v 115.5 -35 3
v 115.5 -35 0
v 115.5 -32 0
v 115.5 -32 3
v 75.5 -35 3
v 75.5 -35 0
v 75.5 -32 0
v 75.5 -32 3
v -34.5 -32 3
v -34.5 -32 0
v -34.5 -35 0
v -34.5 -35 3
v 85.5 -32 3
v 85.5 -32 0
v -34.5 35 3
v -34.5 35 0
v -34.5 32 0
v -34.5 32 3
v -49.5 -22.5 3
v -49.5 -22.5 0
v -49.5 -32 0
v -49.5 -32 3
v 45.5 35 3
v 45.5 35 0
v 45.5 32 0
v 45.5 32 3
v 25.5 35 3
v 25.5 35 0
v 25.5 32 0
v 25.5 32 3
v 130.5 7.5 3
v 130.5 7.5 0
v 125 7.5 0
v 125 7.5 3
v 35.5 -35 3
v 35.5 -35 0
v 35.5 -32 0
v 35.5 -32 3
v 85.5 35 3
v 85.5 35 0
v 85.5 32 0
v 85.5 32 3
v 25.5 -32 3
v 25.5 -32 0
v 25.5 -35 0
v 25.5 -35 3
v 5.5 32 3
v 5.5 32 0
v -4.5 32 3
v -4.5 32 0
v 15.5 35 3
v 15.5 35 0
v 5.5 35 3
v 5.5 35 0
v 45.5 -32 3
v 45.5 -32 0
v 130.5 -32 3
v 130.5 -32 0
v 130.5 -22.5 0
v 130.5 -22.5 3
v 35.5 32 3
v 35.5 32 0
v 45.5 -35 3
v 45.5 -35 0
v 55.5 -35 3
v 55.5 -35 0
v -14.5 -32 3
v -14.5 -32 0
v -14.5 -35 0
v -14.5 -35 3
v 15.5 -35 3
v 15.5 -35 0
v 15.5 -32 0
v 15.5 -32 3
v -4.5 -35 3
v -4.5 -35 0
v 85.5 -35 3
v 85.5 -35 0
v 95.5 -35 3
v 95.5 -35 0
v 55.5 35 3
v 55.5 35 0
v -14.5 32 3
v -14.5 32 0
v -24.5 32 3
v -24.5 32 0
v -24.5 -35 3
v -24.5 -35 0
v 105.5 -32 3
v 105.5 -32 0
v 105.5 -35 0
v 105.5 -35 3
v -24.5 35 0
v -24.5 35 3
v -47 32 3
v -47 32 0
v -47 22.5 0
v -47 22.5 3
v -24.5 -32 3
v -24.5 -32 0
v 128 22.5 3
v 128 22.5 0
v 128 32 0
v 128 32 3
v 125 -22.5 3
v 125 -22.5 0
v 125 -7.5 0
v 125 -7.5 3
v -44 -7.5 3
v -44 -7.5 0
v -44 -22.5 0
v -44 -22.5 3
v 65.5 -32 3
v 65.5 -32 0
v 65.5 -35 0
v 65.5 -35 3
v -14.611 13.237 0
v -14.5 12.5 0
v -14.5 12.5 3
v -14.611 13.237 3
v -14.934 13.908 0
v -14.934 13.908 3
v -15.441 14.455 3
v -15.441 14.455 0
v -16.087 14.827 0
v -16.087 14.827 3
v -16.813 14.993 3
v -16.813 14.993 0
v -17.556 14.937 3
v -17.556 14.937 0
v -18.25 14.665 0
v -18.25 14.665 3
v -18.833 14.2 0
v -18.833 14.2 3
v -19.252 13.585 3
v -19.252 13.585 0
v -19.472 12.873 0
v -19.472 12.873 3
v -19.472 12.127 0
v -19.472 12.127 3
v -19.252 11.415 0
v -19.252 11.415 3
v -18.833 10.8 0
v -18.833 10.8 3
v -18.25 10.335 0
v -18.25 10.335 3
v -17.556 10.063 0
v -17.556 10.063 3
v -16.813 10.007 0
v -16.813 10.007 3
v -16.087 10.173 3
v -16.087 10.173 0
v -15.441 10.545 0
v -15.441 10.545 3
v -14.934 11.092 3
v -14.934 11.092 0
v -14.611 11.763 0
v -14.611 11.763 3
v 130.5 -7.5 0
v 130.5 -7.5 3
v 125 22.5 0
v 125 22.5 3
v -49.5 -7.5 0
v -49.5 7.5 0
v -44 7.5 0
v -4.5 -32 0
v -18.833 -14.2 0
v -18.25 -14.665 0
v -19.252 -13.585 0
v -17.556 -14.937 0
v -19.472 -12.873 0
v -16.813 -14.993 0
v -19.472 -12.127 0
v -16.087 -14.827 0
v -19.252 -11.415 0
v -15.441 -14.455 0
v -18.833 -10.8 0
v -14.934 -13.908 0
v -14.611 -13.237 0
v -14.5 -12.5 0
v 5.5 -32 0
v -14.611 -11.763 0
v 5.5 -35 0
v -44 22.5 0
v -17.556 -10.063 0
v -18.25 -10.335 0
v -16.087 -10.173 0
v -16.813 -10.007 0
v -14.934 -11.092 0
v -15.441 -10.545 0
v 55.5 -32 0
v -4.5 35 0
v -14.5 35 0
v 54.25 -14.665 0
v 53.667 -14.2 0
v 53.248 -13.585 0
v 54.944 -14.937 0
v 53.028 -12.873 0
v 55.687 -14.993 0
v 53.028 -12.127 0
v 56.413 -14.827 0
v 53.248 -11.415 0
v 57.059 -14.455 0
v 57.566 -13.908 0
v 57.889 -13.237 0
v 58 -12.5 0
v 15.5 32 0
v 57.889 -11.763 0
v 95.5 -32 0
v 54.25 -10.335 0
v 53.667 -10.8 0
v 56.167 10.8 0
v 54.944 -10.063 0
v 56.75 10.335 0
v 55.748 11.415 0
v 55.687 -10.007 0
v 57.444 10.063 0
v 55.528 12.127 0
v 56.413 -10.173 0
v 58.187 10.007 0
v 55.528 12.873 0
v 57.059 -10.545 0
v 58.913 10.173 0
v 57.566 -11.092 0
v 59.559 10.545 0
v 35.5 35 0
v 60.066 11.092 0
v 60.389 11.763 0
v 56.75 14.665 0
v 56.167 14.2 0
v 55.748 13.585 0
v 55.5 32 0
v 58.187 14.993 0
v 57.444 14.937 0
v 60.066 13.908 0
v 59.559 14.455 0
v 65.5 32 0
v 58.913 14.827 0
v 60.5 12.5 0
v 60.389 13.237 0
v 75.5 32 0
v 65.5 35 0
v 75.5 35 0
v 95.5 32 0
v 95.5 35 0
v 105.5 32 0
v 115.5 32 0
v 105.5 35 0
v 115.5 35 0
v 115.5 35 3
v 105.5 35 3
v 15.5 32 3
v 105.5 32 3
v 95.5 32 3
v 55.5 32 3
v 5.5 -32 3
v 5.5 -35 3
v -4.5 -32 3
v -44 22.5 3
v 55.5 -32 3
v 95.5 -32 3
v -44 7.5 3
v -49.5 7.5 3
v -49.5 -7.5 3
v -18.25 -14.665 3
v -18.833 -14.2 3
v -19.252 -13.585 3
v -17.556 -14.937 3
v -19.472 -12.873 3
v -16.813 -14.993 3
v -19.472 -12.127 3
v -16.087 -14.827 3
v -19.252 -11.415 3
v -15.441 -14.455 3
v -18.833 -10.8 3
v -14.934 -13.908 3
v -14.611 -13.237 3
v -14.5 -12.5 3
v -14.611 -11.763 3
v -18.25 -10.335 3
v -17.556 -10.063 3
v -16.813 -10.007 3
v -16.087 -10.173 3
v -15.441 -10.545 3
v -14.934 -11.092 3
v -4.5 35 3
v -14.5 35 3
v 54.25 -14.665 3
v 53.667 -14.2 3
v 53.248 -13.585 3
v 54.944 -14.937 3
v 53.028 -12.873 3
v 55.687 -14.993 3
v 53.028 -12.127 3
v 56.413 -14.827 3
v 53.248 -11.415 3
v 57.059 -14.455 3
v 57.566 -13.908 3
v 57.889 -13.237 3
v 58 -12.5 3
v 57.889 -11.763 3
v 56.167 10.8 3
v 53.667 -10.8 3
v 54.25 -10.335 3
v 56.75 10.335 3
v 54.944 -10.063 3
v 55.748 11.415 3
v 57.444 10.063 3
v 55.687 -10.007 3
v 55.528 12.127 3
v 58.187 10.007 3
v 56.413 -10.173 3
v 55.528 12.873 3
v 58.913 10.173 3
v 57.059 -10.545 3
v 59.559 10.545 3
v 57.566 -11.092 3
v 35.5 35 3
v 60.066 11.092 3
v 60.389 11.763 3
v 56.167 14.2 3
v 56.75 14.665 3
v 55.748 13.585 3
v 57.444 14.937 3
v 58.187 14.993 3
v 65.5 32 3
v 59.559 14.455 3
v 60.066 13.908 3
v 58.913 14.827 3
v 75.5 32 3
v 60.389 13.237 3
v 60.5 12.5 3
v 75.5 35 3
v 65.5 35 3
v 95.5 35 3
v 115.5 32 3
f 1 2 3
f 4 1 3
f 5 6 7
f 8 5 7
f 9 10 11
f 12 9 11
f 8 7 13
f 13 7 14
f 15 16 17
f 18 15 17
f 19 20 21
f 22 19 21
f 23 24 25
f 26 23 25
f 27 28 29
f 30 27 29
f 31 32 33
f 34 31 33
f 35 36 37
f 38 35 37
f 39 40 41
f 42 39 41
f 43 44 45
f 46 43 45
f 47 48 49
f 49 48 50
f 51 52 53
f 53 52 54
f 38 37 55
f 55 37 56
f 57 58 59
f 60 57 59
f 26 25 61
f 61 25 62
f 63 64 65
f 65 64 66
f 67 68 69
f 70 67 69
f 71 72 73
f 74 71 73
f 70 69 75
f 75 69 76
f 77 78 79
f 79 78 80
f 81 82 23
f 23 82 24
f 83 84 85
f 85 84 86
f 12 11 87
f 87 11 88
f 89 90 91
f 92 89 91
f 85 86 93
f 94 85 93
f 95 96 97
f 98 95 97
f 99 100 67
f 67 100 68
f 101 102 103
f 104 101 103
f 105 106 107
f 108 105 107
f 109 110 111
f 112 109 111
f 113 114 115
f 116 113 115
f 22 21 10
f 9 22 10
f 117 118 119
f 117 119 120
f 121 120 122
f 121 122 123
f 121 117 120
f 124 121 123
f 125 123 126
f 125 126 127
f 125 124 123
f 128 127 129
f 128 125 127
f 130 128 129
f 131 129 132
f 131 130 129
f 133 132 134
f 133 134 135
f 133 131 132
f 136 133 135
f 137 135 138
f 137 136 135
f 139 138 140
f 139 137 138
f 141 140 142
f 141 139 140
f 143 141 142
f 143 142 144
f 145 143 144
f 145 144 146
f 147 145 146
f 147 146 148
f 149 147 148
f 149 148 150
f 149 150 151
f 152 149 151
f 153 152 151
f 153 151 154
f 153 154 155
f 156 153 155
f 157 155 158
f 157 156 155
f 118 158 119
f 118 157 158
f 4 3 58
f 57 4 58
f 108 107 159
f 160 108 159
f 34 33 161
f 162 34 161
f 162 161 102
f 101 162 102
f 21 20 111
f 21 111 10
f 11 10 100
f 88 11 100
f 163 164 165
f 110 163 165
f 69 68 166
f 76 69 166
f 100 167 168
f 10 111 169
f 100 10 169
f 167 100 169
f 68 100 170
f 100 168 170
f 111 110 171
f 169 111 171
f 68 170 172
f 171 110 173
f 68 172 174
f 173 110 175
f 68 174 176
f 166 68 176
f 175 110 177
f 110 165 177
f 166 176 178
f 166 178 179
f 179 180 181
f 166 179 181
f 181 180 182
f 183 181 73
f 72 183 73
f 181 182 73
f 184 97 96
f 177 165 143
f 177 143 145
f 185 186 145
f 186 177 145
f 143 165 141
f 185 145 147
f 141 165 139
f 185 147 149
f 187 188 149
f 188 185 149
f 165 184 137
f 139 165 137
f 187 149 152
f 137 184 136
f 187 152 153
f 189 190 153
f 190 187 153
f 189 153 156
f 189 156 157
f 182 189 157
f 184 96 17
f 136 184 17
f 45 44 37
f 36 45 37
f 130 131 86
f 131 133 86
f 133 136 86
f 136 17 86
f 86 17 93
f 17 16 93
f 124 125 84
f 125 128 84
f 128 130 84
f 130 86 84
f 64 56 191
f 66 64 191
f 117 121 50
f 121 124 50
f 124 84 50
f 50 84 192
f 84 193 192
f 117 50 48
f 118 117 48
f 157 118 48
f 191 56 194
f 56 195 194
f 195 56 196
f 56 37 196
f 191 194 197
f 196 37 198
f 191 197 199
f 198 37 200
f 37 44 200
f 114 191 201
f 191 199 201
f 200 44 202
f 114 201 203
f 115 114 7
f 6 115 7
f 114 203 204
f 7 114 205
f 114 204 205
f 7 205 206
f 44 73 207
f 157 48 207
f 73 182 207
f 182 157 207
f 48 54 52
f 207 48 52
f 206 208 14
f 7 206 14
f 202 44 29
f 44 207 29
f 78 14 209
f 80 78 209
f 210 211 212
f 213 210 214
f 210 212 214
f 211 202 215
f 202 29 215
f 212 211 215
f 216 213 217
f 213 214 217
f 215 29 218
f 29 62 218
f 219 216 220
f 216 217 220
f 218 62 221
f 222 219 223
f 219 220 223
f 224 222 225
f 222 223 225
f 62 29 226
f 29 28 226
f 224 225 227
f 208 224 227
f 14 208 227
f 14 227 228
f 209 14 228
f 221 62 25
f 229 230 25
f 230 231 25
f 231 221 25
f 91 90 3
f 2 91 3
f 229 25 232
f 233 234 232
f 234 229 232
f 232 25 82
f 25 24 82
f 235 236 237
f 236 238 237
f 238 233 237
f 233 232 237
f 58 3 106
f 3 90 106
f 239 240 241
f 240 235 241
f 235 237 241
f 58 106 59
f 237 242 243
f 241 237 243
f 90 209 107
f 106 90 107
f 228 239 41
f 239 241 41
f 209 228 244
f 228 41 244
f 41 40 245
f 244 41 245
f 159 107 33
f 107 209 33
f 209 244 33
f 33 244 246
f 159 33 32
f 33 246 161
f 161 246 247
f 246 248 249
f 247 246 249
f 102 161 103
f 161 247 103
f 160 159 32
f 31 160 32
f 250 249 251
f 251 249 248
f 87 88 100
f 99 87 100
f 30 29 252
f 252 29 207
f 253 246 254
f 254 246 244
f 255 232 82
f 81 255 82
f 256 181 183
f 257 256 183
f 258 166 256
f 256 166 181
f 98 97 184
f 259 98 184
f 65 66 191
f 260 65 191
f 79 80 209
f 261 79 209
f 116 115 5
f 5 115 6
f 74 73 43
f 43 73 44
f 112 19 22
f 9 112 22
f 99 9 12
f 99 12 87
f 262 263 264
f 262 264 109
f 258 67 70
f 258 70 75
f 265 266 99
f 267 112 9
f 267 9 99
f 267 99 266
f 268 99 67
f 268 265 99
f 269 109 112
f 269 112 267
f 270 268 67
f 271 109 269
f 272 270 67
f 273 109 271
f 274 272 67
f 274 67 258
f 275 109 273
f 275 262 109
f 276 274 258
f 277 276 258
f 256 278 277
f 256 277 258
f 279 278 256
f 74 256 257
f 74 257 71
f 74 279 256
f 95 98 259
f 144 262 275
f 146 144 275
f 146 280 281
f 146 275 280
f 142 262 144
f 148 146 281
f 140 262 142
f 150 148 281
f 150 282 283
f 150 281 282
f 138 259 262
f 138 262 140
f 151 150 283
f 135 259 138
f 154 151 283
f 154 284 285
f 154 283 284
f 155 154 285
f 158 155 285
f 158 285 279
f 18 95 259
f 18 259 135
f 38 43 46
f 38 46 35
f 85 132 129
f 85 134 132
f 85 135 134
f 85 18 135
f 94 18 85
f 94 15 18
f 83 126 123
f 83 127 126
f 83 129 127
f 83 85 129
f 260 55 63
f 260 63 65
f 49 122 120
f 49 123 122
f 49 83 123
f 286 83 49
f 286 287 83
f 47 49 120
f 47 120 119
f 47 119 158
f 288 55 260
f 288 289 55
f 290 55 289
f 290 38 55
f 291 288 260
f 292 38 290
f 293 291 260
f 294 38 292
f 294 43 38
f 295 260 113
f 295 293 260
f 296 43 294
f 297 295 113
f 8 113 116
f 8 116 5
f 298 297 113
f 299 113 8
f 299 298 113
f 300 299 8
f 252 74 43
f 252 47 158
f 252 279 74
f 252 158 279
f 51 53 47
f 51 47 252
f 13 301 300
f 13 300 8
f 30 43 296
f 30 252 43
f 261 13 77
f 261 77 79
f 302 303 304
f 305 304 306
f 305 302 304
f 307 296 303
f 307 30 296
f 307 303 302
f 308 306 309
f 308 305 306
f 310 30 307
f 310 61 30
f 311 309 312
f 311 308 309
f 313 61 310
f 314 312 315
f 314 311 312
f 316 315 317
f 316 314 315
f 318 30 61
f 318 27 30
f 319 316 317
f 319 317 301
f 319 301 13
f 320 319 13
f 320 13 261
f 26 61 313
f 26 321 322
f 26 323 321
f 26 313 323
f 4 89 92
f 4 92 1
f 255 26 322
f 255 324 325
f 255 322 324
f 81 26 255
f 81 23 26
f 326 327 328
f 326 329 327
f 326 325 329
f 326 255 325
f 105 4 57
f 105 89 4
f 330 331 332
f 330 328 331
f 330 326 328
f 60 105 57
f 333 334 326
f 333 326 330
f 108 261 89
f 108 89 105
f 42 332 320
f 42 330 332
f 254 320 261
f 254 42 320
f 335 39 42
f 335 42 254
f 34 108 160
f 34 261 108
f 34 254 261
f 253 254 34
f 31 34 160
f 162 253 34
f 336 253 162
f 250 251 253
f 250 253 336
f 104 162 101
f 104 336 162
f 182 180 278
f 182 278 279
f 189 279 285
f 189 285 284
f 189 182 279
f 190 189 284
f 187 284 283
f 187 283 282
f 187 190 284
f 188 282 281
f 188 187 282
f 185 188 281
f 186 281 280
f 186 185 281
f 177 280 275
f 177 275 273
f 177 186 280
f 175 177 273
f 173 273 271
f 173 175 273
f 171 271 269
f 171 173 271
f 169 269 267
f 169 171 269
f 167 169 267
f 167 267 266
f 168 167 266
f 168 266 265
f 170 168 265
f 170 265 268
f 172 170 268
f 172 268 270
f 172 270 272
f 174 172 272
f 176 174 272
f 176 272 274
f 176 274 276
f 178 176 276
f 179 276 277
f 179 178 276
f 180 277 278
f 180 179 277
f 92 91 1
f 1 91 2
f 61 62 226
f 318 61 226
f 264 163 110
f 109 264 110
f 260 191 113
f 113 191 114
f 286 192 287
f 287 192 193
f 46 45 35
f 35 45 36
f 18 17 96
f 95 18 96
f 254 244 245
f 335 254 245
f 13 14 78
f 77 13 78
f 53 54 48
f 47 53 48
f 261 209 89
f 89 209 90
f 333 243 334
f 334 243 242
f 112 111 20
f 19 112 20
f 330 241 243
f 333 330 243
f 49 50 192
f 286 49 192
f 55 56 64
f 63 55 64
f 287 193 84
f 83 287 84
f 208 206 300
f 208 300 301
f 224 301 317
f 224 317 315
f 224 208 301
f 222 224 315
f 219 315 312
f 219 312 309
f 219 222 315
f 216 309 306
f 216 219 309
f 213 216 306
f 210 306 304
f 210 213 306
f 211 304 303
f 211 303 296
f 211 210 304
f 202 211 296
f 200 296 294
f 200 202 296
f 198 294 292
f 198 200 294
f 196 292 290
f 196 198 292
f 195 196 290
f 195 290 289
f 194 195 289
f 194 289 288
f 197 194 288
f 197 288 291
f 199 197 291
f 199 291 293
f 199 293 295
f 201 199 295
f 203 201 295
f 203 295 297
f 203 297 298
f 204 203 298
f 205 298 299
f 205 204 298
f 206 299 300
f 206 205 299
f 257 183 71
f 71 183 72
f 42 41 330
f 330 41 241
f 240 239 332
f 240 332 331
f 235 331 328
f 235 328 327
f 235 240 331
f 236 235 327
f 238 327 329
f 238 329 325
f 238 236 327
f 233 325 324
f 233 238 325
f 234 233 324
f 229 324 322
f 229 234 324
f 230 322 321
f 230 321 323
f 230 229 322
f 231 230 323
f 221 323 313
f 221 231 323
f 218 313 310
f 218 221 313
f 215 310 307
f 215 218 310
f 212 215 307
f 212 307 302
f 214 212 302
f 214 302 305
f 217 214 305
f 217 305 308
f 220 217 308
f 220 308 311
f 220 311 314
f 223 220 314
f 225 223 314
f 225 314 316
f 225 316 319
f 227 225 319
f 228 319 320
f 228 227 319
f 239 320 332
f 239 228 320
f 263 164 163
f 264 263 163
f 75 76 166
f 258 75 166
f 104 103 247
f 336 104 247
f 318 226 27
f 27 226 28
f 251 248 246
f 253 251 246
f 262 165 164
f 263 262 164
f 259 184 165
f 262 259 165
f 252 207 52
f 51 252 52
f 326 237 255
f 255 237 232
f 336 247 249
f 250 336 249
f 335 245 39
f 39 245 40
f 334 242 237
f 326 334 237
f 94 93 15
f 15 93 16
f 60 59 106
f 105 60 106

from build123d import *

# Parameters (mm, degrees)
F0_R     = 2.5
F1_DEPTH = 3


# Not quite as in the source:
# - ends of sketch curves that miss each other by under 0.0002 mm in the source are joined


with BuildPart() as f1:
    # F0 (on Top) → F1 (new body)
    with BuildSketch(Plane.XY):
        Polygon((-34.5, 32), (-47, 32), (-47, 22.4999984801), (-44, 22.4999984801), (-44, 7.4999984801), (-49.5, 7.4999984801), (-49.5, -7.5000015199), (-44, -7.5000015199), (-44, -22.5000015199), (-49.5, -22.5000015199), (-49.5, -32.0000015199), (-34.5, -32), (-34.5, -35), (-24.5, -35), (-24.5, -32), (-14.5, -32), (-14.5, -35), (-4.5, -35), (-4.5, -32), (5.5, -32), (5.5, -35), (15.5, -35), (15.5, -32), (25.5, -32), (25.5, -35), (35.5, -35), (35.5, -32), (40.5, -32), (45.5, -32), (45.5, -35), (55.5, -35), (55.5, -32), (65.5, -32), (65.5, -35), (75.5, -35), (75.5, -32), (85.5, -32), (85.5, -35), (95.5, -35), (95.5, -32), (105.5, -32), (105.5, -35), (115.5, -35), (115.5, -32), (130.5, -32), (130.5, -22.5000015199), (125, -22.5000015199), (125, -7.5000015199), (130.5, -7.5000015199), (130.5, 7.4999984801), (125, 7.4999984801), (125, 22.4999984801), (128, 22.4999984801), (128, 31.9999984801), (115.5, 32), (115.5, 35), (105.5, 35), (105.5, 32), (95.5, 32), (95.5, 35), (85.5, 35), (85.5, 32), (75.5, 32), (75.5, 35), (65.5, 35), (65.5, 32), (55.5, 32), (55.5, 35), (45.5, 35), (45.5, 32), (40.5, 32), (35.5, 32), (35.5, 35), (25.5, 35), (25.5, 32), (15.5, 32), (15.5, 35), (5.5, 35), (5.5, 32), (-4.5, 32), (-4.5, 35), (-14.5, 35), (-14.5, 32), (-24.5, 32), (-24.5, 35), (-34.5, 35), align=None)
        with Locations((-17, -12.5)):
            Circle(F0_R, mode=Mode.SUBTRACT)
        with Locations((55.5, -12.5)):
            Circle(F0_R, mode=Mode.SUBTRACT)
        with Locations((-17, 12.5)):
            Circle(F0_R, mode=Mode.SUBTRACT)
        with Locations((58, 12.5)):
            Circle(F0_R, mode=Mode.SUBTRACT)
    extrude(amount=F1_DEPTH)


solid = f1.part
